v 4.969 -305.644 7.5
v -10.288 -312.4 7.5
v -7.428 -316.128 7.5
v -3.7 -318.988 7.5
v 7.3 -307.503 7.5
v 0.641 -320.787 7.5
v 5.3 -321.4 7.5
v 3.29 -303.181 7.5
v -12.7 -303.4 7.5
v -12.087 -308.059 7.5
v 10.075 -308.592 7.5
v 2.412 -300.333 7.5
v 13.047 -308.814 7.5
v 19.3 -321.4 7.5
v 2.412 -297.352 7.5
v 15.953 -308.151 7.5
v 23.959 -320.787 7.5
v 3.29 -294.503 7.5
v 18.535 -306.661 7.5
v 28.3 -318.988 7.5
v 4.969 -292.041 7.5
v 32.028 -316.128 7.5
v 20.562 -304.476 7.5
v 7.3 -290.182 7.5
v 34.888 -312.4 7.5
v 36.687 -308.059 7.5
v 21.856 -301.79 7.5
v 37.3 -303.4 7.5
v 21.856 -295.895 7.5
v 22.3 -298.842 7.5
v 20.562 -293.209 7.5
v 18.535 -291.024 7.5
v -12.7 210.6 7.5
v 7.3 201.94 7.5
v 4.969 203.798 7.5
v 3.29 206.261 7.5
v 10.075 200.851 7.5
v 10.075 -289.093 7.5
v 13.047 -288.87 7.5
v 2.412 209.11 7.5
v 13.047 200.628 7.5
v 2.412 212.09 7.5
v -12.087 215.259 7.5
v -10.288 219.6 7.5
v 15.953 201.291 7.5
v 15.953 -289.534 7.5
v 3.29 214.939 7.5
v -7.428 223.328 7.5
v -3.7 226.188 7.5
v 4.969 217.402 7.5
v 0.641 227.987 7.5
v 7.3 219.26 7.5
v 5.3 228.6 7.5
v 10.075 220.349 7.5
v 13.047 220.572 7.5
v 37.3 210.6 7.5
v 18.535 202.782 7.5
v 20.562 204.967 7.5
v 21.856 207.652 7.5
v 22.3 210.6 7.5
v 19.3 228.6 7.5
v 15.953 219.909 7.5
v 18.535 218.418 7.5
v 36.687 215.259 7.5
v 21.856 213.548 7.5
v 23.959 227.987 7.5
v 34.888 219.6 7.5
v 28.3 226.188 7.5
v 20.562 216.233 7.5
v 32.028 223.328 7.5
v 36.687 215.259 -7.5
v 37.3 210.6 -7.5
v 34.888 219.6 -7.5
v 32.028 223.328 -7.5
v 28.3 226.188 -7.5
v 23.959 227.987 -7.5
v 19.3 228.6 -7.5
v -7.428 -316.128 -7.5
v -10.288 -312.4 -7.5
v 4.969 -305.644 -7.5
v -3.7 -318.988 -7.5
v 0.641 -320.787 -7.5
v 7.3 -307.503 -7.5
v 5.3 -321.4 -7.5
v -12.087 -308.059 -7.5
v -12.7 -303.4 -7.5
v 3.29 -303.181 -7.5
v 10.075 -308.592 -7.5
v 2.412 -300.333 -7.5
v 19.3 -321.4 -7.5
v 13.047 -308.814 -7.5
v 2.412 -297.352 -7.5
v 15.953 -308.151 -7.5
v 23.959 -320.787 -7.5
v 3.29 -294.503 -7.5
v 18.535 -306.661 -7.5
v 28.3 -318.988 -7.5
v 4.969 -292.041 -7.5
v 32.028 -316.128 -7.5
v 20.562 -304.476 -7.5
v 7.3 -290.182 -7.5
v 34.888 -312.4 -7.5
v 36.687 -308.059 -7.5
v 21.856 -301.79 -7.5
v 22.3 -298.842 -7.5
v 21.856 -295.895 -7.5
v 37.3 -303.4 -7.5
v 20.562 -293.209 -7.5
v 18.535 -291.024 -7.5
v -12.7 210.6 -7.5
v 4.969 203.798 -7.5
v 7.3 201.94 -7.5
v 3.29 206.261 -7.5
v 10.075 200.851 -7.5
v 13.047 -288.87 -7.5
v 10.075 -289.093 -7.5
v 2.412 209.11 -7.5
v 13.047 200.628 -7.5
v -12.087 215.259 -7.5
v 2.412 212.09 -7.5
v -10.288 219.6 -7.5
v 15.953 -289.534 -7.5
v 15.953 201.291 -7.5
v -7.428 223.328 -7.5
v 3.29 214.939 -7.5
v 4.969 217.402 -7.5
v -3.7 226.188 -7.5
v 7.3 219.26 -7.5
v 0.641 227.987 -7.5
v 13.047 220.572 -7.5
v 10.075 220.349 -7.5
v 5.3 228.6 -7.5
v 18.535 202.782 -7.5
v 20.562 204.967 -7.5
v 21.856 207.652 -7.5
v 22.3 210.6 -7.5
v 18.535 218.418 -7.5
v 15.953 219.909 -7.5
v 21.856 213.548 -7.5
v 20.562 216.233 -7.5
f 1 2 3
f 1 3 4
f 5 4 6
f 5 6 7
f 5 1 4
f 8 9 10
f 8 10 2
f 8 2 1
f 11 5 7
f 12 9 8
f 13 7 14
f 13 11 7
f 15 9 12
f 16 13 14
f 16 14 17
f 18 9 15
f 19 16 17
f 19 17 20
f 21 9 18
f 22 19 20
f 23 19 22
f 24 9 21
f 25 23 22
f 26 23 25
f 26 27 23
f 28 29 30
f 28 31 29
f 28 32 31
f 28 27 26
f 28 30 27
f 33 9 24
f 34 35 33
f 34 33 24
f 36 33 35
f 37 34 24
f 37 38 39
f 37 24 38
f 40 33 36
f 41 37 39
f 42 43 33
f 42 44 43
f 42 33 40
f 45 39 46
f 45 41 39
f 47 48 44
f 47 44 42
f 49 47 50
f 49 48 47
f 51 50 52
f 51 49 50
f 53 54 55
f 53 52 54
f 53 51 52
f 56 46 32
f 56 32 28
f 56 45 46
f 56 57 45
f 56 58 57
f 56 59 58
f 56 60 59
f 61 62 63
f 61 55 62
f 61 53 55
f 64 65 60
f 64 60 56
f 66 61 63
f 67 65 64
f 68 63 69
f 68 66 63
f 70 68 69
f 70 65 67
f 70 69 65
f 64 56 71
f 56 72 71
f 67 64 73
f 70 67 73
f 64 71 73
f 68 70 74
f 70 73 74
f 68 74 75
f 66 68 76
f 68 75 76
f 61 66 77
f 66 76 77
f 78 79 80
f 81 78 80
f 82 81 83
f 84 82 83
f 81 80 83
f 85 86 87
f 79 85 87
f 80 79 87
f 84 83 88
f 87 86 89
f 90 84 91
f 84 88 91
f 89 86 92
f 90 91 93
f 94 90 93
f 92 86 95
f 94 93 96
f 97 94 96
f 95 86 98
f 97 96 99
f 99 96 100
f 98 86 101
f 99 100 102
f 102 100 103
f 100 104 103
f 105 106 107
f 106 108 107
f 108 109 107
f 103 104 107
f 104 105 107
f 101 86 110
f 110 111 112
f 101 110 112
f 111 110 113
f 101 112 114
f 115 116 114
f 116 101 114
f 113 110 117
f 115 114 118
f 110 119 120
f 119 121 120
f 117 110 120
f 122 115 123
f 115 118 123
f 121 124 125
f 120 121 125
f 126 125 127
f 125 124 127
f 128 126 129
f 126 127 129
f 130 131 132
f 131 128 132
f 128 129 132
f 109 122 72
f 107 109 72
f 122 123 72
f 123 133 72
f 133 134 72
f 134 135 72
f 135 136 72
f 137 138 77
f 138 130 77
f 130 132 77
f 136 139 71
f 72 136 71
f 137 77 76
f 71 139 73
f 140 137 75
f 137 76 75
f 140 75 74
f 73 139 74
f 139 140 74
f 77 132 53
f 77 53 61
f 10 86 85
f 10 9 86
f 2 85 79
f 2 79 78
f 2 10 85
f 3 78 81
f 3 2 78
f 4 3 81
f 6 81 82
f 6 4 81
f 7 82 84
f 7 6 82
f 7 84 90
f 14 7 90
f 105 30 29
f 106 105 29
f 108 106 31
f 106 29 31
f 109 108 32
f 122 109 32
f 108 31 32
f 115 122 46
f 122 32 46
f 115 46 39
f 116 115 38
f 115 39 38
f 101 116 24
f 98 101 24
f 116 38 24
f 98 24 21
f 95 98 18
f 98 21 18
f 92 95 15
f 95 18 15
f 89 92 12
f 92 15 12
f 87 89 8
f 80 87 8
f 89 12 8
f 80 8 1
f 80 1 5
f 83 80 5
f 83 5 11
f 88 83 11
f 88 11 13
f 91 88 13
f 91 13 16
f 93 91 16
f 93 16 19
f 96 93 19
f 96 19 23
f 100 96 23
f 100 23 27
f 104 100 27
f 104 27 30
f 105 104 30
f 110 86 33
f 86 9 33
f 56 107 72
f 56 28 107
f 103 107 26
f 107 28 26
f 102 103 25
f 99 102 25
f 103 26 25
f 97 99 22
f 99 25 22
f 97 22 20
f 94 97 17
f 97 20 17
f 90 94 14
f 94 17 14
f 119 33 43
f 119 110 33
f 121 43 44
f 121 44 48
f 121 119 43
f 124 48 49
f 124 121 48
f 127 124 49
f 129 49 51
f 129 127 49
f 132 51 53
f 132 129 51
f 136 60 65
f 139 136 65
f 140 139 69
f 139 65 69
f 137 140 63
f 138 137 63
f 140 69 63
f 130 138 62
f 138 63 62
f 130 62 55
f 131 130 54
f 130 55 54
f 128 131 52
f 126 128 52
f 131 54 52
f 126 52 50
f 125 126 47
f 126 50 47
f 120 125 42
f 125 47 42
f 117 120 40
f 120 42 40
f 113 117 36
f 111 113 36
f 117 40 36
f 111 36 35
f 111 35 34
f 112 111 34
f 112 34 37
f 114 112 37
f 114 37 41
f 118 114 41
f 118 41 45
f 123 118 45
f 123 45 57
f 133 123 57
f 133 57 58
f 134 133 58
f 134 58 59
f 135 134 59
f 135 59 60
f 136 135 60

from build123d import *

# Parameters (mm, degrees)
SKETCH7_W           = 50
SKETCH7_H           = 550
BOSS_EXTRUDE1_DEPTH = 7.5
FILLET1_R           = 18
SKETCH8_R           = 10
CUT_EXTRUDE1_DEPTH  = 324.904692772
SKETCH9_R           = 10
CUT_EXTRUDE2_DEPTH  = 324.904692772


with BuildPart() as part:
    # Sketch7 → Boss-Extrude1 (new, symmetric)
    with BuildSketch(Plane.XY):
        with Locations((12.3, -46.4)):
            Rectangle(SKETCH7_W, SKETCH7_H)
    extrude(amount=BOSS_EXTRUDE1_DEPTH, both=True)

    # Fillet1
    fillet1_edges = [part.edges().sort_by_distance(p)[0] for p in [
        (-12.7, 228.6, 0),
        (37.3, 228.6, 0),
        (37.3, -321.4, 0),
        (-12.7, -321.4, 0),
    ]]
    fillet(fillet1_edges, radius=FILLET1_R)

    # Sketch8 → Cut-Extrude1 (cut, through all)
    with BuildSketch(Plane.XY.offset(7.5)):
        with Locations((12.3, 210.6)):
            Circle(SKETCH8_R)
    extrude(amount=-CUT_EXTRUDE1_DEPTH, mode=Mode.SUBTRACT)

    # Sketch9 → Cut-Extrude2 (cut, through all)
    with BuildSketch(Plane.XY.offset(7.5)):
        with Locations((12.3, -298.842314327)):
            Circle(SKETCH9_R)
    extrude(amount=-CUT_EXTRUDE2_DEPTH, mode=Mode.SUBTRACT)


solid = part.part
